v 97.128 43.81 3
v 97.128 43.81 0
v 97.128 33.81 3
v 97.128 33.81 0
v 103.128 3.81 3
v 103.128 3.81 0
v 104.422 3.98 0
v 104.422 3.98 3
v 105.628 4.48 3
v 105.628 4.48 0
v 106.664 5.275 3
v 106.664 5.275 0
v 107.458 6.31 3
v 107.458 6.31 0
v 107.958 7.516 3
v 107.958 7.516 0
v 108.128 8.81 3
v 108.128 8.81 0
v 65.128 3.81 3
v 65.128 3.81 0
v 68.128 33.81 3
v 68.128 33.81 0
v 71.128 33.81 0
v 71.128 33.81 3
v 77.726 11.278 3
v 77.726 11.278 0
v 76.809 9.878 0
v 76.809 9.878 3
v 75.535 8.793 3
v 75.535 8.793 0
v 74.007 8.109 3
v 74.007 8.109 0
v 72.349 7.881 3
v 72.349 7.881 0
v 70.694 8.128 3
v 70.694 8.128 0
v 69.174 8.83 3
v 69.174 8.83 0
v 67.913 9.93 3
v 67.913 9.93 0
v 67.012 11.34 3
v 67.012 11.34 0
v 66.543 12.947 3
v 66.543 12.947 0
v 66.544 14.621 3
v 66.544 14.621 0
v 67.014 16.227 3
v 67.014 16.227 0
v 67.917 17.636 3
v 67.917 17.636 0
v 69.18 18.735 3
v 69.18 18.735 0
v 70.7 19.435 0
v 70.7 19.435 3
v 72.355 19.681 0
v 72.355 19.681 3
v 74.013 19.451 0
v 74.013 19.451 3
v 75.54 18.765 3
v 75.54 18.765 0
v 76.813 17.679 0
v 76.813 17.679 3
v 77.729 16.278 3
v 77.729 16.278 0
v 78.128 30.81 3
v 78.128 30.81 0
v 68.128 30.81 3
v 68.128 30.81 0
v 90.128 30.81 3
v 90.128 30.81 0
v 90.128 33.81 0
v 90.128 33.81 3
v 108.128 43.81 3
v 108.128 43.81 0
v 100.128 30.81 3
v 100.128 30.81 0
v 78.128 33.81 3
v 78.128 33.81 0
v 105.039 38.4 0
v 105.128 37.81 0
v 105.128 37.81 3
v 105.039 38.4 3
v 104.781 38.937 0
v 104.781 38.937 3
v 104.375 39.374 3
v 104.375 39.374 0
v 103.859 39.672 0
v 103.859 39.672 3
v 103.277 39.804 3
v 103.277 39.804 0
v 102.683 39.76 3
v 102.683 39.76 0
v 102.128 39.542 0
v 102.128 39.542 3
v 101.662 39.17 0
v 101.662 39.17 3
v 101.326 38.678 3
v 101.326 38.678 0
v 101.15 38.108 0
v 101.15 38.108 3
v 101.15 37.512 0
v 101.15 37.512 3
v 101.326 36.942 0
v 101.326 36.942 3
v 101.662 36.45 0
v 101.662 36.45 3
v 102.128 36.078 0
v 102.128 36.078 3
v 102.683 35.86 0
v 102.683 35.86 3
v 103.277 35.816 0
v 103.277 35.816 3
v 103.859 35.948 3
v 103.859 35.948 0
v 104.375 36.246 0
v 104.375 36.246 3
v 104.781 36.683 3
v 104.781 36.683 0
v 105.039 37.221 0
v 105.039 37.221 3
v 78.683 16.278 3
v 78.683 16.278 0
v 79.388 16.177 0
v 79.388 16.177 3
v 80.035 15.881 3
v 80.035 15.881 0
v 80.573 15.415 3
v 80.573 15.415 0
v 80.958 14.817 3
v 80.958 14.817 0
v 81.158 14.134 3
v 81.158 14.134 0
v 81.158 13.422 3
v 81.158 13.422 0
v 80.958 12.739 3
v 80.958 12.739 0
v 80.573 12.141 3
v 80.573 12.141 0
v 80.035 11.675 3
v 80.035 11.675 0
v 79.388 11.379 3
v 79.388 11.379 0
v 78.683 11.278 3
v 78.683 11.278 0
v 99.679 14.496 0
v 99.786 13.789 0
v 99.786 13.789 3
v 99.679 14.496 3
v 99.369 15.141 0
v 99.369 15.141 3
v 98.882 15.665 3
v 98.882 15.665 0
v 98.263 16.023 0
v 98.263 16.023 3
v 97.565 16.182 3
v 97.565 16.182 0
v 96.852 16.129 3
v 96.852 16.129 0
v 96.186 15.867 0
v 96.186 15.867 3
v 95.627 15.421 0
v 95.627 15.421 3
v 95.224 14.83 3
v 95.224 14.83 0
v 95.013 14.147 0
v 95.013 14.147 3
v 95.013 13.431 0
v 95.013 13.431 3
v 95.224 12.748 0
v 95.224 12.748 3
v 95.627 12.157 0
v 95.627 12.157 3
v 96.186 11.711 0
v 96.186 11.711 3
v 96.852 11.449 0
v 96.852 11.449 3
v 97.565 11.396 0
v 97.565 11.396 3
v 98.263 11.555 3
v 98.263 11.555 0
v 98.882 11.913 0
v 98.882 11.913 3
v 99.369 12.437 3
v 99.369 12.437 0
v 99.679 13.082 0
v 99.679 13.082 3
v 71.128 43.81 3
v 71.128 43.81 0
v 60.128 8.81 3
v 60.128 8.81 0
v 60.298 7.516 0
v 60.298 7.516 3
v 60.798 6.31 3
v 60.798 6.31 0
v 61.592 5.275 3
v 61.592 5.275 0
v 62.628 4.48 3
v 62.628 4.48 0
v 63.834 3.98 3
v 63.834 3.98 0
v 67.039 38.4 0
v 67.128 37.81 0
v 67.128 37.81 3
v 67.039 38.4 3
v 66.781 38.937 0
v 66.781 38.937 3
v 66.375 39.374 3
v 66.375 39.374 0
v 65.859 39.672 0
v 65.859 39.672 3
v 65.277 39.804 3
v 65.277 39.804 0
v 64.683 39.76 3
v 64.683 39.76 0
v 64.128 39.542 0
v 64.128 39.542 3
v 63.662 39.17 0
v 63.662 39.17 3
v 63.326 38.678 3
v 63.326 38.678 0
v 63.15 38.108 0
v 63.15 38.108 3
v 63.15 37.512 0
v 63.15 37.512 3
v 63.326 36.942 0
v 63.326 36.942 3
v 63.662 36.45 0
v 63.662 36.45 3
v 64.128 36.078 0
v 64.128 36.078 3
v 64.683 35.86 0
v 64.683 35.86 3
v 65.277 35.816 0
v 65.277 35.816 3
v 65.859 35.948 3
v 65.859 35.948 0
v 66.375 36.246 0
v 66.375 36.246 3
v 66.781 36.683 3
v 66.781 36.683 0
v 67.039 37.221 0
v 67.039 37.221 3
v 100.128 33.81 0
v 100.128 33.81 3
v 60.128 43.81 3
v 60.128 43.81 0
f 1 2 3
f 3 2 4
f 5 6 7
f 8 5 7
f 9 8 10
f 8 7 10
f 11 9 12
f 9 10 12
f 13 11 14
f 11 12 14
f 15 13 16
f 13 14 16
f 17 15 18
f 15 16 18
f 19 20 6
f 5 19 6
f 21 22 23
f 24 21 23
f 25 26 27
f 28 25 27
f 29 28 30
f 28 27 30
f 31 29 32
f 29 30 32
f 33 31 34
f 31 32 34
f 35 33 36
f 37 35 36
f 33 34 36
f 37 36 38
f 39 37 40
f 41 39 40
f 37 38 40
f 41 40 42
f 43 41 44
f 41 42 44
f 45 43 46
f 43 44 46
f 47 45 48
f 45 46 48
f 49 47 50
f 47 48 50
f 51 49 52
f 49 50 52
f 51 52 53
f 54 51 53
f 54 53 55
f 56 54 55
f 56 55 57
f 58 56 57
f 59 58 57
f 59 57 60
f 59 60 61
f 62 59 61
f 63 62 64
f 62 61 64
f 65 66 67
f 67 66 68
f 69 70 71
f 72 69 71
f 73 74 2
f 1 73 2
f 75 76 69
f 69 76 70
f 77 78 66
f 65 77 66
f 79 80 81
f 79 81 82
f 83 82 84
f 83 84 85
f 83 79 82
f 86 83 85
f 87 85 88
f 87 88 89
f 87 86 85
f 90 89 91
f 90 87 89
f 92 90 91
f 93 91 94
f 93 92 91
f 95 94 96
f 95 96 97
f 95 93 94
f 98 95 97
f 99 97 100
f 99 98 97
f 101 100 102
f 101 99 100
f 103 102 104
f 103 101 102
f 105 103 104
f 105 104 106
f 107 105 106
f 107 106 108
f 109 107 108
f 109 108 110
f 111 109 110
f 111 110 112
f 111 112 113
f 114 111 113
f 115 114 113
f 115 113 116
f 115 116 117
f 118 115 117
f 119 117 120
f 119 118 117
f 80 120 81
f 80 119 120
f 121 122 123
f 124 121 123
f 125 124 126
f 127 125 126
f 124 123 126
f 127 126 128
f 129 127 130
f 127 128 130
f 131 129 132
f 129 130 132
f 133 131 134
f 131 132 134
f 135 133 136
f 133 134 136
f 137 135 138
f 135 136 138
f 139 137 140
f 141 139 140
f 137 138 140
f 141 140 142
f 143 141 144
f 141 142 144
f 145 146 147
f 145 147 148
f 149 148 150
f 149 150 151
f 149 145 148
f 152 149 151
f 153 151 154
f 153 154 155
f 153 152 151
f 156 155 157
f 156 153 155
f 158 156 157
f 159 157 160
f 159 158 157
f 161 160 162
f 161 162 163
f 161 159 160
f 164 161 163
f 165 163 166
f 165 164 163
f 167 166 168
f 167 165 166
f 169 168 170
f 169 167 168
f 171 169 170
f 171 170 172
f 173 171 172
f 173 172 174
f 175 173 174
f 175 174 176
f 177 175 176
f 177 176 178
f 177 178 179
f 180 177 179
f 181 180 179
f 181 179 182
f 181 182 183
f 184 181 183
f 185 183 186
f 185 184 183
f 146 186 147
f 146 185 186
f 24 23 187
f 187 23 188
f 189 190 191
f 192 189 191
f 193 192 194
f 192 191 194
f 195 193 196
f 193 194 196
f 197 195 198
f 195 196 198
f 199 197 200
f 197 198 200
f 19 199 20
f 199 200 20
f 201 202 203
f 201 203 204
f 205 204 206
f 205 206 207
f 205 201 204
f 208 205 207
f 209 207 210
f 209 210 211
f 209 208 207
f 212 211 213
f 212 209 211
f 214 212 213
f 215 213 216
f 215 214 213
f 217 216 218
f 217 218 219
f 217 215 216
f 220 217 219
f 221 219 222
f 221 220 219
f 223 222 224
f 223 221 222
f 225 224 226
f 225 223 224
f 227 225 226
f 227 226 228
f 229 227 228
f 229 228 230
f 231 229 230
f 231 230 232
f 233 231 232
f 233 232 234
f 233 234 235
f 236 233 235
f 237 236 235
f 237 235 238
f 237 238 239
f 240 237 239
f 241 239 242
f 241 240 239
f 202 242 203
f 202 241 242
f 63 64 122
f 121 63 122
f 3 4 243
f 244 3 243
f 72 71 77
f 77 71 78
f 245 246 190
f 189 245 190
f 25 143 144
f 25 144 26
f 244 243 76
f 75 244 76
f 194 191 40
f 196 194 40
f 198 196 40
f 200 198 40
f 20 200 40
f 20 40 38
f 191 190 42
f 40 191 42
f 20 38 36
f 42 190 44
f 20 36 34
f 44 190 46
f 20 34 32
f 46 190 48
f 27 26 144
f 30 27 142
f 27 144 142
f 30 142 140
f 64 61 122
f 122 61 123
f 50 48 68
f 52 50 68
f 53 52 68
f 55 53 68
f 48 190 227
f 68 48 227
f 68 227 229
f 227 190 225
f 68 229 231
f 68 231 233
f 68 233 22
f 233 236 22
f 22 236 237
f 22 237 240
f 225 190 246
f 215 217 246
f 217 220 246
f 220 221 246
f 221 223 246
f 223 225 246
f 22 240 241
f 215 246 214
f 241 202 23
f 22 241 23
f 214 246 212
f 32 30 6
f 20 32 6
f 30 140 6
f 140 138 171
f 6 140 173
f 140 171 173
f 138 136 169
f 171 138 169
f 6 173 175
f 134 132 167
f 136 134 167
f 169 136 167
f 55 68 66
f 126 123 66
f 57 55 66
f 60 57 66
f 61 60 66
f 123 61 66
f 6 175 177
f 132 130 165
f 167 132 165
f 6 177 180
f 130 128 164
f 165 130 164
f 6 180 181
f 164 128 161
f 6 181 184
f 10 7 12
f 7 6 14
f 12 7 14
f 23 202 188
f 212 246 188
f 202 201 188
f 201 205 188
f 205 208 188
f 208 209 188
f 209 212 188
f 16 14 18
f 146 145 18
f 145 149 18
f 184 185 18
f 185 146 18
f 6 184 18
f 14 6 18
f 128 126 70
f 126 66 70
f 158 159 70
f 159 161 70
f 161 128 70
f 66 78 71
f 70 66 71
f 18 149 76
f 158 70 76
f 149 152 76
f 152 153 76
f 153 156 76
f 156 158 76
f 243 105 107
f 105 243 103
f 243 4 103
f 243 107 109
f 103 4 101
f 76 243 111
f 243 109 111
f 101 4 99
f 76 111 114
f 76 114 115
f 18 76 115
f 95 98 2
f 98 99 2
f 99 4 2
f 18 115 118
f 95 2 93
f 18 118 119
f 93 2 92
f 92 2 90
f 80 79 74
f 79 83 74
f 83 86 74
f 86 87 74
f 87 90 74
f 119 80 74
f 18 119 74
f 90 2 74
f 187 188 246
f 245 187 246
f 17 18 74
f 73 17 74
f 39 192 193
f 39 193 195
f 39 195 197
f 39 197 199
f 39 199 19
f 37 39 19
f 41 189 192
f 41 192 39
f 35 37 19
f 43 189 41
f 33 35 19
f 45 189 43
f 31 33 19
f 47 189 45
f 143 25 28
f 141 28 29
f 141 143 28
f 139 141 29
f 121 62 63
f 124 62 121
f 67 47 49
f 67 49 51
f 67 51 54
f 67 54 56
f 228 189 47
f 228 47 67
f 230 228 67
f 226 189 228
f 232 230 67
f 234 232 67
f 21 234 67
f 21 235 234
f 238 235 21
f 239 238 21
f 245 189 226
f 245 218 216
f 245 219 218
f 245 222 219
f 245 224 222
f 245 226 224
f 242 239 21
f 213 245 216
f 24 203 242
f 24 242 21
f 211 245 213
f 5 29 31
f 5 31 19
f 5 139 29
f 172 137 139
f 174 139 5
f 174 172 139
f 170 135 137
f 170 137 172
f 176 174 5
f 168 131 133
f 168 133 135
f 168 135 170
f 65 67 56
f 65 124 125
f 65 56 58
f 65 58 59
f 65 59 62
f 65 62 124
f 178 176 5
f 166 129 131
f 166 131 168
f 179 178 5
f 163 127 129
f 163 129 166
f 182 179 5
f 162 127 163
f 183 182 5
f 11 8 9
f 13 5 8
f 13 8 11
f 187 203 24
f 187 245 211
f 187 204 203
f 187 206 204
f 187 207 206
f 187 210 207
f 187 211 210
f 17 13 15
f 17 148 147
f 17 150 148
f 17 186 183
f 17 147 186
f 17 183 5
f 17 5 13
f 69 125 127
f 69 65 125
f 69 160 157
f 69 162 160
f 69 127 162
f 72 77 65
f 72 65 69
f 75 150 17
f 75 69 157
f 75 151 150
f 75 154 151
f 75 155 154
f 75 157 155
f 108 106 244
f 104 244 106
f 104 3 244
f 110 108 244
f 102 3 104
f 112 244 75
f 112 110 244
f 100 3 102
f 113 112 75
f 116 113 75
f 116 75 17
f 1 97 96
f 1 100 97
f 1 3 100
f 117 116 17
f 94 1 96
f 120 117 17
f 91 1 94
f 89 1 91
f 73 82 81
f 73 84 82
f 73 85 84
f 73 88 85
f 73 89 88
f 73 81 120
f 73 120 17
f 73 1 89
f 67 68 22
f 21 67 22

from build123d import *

# Parameters (mm, degrees)
MODEL_R                 = 2.4
MODEL_R_2               = 2
SALIENTE_EXTRUIR1_DEPTH = 3


with BuildPart() as part:
    # Model → Saliente-Extruir1 (new body)
    with BuildSketch(Plane.XY):
        with BuildLine():
            Line((60.128031424, 43.810084434), (60.128031424, 26.988429812))
            Line((60.128031424, 26.988429812), (60.128031424, 8.810084434))
            ThreePointArc((60.128031424, 8.810084434), (61.592497518, 5.274550528), (65.128031424, 3.810084434))
            Line((65.128031424, 3.810084434), (103.128031424, 3.810084434))
            ThreePointArc((103.128031424, 3.810084434), (106.66356533, 5.274550528), (108.128031424, 8.810084434))
            Line((108.128031424, 8.810084434), (108.128031424, 43.810084434))
            Line((108.128031424, 43.810084434), (97.128031424, 43.810084434))
            Line((97.128031424, 43.810084434), (97.128031424, 33.810084434))
            Line((97.128031424, 33.810084434), (100.128031424, 33.810084434))
            Line((100.128031424, 33.810084434), (100.128031424, 30.810084434))
            Line((100.128031424, 30.810084434), (90.128031424, 30.810084434))
            Line((90.128031424, 30.810084434), (90.128031424, 33.810084434))
            Line((90.128031424, 33.810084434), (78.128031424, 33.810084434))
            Line((78.128031424, 33.810084434), (78.128031424, 30.810084434))
            Line((78.128031424, 30.810084434), (68.128031424, 30.810084434))
            Line((68.128031424, 30.810084434), (68.128031424, 33.810084434))
            Line((68.128031424, 33.810084434), (71.128031424, 33.810084434))
            Line((71.128031424, 33.810084434), (71.128031424, 43.810084434))
            Line((71.128031424, 43.810084434), (60.128031424, 43.810084434))
        make_face()
        with Locations((97.386085589, 13.789032772)):
            Circle(MODEL_R, mode=Mode.SUBTRACT)
        with Locations((65.128031424, 37.810084434)):
            Circle(MODEL_R_2, mode=Mode.SUBTRACT)
        with Locations((103.128031424, 37.810084434)):
            Circle(MODEL_R_2, mode=Mode.SUBTRACT)
        with BuildLine():
            Line((78.683481489, 11.277984768), (77.72633505, 11.277984768))
            ThreePointArc((77.72633505, 11.277984768), (66.483480743, 13.783830387), (77.728934453, 16.277984768))
            Line((77.728934453, 16.277984768), (78.683481489, 16.277984768))
            ThreePointArc((78.683481489, 16.277984768), (81.183481489, 13.777984768), (78.683481489, 11.277984768))
        make_face(mode=Mode.SUBTRACT)
    extrude(amount=SALIENTE_EXTRUIR1_DEPTH)


solid = part.part
